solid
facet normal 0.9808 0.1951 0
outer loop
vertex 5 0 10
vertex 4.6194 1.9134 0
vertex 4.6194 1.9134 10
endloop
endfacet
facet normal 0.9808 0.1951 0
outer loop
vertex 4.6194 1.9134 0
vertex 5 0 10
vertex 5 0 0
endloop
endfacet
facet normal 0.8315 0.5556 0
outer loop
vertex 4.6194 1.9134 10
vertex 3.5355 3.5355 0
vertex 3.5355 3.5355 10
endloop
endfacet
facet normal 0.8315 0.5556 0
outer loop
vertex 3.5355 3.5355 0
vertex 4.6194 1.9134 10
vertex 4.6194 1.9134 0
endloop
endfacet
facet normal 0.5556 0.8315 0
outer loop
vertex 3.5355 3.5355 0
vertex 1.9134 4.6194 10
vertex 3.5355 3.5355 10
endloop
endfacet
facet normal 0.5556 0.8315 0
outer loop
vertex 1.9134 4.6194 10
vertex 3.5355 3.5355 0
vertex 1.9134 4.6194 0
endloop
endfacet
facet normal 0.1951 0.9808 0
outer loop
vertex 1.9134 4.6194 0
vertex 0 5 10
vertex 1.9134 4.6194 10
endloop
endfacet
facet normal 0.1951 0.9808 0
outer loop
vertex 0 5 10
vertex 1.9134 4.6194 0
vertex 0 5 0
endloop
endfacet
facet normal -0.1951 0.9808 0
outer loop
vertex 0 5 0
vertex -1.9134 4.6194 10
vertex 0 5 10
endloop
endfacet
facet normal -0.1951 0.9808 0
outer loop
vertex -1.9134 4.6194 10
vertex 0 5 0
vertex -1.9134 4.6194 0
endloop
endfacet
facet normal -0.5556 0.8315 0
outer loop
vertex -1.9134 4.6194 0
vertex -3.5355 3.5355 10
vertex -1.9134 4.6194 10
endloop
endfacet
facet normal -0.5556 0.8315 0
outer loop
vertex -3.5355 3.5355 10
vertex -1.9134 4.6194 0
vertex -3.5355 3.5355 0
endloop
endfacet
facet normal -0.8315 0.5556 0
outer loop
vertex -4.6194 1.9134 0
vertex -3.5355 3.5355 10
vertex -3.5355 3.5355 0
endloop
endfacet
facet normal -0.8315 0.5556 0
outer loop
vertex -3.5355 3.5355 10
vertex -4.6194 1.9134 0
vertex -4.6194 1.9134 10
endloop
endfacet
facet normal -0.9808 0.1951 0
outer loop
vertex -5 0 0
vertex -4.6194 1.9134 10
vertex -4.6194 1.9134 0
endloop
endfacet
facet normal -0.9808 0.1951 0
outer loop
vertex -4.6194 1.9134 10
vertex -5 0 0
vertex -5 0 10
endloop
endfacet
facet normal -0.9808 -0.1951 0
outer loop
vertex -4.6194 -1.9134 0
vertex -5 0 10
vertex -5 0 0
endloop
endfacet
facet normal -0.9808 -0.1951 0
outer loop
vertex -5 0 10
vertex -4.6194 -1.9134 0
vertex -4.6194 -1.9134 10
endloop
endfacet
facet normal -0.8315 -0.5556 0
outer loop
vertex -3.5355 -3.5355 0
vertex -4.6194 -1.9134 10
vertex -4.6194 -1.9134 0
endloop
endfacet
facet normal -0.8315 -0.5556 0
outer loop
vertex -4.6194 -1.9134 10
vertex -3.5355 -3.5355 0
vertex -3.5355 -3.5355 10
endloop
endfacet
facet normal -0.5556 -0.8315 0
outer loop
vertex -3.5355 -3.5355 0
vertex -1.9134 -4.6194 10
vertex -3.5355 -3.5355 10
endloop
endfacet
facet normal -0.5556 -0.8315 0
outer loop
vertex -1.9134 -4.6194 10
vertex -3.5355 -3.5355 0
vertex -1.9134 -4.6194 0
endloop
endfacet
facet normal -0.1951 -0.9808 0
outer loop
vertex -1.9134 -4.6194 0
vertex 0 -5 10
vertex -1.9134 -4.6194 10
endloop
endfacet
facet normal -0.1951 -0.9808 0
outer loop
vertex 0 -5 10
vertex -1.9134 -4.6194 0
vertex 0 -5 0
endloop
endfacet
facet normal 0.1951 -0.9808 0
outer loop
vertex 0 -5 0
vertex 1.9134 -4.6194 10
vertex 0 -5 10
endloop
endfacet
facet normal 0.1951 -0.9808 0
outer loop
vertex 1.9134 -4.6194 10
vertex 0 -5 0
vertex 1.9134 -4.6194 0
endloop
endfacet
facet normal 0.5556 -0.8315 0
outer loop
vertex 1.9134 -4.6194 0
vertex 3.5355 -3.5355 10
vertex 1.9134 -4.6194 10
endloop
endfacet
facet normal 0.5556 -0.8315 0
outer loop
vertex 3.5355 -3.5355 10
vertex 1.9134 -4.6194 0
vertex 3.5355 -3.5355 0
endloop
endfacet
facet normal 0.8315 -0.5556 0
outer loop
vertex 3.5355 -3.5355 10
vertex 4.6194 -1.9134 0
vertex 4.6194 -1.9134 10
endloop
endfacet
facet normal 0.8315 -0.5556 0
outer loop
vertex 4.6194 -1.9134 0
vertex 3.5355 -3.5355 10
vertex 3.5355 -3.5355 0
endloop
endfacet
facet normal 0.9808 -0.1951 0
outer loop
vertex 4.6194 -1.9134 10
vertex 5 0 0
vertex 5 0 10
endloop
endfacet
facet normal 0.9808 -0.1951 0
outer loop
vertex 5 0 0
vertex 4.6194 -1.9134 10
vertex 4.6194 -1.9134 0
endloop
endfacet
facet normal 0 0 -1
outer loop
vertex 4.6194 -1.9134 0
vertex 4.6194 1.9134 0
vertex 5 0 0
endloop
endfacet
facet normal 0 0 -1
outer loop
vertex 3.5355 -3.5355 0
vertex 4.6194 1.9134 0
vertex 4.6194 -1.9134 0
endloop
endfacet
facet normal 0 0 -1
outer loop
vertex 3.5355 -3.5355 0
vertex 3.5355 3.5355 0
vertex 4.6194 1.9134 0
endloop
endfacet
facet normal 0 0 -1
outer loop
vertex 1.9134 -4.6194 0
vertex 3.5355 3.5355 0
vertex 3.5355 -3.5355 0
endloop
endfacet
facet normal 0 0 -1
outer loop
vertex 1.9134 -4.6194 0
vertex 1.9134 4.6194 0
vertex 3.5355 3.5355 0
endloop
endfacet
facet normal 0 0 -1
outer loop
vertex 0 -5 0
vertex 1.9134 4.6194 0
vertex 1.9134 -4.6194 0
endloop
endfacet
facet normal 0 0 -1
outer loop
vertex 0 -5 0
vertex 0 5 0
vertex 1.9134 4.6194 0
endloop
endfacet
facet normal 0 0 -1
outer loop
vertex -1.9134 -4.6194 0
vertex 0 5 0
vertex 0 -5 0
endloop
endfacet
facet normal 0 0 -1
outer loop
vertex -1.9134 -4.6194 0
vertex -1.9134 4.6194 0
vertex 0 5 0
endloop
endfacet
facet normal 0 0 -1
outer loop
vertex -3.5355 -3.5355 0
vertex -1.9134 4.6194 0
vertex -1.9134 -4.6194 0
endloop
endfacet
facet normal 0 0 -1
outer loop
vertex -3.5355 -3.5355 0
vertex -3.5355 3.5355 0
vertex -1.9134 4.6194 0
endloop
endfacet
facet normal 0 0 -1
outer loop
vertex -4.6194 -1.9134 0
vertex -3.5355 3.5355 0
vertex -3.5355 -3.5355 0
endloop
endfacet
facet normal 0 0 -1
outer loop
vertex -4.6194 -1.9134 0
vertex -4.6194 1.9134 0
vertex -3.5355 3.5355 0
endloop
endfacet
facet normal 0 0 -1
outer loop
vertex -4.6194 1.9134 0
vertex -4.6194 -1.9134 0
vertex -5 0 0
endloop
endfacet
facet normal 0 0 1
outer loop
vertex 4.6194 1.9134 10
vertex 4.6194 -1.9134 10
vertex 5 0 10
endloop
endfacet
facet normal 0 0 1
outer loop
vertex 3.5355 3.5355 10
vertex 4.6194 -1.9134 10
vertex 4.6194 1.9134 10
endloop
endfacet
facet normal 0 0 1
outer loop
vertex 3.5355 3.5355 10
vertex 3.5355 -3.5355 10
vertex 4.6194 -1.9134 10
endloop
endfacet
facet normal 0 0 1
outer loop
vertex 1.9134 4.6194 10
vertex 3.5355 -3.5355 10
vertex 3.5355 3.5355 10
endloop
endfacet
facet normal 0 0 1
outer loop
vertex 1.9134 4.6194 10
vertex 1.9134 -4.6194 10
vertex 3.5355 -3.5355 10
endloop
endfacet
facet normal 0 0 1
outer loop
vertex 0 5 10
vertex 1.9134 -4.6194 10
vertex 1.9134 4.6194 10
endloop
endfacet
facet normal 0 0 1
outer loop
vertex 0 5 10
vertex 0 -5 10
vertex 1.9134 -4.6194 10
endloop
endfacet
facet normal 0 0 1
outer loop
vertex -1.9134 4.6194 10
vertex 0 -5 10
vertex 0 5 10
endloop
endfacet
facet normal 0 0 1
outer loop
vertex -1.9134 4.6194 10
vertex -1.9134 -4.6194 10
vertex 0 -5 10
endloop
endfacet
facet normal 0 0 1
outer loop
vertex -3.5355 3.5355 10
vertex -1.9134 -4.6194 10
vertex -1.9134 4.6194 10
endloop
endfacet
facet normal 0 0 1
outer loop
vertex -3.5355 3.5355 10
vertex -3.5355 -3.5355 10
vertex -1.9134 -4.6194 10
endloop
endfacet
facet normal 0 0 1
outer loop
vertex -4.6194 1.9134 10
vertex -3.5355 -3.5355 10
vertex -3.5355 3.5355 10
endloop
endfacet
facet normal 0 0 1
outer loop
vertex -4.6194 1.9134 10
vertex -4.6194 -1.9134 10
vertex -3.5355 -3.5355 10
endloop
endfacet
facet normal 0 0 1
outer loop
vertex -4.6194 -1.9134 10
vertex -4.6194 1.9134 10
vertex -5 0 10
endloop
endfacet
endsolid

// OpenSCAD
// Generated by CadMonkey
// Prompt: hey cadmonkey, create me a cylinder
// Generated at: 2025-11-10 21:30:08

cylinder(h=10, r=5);
